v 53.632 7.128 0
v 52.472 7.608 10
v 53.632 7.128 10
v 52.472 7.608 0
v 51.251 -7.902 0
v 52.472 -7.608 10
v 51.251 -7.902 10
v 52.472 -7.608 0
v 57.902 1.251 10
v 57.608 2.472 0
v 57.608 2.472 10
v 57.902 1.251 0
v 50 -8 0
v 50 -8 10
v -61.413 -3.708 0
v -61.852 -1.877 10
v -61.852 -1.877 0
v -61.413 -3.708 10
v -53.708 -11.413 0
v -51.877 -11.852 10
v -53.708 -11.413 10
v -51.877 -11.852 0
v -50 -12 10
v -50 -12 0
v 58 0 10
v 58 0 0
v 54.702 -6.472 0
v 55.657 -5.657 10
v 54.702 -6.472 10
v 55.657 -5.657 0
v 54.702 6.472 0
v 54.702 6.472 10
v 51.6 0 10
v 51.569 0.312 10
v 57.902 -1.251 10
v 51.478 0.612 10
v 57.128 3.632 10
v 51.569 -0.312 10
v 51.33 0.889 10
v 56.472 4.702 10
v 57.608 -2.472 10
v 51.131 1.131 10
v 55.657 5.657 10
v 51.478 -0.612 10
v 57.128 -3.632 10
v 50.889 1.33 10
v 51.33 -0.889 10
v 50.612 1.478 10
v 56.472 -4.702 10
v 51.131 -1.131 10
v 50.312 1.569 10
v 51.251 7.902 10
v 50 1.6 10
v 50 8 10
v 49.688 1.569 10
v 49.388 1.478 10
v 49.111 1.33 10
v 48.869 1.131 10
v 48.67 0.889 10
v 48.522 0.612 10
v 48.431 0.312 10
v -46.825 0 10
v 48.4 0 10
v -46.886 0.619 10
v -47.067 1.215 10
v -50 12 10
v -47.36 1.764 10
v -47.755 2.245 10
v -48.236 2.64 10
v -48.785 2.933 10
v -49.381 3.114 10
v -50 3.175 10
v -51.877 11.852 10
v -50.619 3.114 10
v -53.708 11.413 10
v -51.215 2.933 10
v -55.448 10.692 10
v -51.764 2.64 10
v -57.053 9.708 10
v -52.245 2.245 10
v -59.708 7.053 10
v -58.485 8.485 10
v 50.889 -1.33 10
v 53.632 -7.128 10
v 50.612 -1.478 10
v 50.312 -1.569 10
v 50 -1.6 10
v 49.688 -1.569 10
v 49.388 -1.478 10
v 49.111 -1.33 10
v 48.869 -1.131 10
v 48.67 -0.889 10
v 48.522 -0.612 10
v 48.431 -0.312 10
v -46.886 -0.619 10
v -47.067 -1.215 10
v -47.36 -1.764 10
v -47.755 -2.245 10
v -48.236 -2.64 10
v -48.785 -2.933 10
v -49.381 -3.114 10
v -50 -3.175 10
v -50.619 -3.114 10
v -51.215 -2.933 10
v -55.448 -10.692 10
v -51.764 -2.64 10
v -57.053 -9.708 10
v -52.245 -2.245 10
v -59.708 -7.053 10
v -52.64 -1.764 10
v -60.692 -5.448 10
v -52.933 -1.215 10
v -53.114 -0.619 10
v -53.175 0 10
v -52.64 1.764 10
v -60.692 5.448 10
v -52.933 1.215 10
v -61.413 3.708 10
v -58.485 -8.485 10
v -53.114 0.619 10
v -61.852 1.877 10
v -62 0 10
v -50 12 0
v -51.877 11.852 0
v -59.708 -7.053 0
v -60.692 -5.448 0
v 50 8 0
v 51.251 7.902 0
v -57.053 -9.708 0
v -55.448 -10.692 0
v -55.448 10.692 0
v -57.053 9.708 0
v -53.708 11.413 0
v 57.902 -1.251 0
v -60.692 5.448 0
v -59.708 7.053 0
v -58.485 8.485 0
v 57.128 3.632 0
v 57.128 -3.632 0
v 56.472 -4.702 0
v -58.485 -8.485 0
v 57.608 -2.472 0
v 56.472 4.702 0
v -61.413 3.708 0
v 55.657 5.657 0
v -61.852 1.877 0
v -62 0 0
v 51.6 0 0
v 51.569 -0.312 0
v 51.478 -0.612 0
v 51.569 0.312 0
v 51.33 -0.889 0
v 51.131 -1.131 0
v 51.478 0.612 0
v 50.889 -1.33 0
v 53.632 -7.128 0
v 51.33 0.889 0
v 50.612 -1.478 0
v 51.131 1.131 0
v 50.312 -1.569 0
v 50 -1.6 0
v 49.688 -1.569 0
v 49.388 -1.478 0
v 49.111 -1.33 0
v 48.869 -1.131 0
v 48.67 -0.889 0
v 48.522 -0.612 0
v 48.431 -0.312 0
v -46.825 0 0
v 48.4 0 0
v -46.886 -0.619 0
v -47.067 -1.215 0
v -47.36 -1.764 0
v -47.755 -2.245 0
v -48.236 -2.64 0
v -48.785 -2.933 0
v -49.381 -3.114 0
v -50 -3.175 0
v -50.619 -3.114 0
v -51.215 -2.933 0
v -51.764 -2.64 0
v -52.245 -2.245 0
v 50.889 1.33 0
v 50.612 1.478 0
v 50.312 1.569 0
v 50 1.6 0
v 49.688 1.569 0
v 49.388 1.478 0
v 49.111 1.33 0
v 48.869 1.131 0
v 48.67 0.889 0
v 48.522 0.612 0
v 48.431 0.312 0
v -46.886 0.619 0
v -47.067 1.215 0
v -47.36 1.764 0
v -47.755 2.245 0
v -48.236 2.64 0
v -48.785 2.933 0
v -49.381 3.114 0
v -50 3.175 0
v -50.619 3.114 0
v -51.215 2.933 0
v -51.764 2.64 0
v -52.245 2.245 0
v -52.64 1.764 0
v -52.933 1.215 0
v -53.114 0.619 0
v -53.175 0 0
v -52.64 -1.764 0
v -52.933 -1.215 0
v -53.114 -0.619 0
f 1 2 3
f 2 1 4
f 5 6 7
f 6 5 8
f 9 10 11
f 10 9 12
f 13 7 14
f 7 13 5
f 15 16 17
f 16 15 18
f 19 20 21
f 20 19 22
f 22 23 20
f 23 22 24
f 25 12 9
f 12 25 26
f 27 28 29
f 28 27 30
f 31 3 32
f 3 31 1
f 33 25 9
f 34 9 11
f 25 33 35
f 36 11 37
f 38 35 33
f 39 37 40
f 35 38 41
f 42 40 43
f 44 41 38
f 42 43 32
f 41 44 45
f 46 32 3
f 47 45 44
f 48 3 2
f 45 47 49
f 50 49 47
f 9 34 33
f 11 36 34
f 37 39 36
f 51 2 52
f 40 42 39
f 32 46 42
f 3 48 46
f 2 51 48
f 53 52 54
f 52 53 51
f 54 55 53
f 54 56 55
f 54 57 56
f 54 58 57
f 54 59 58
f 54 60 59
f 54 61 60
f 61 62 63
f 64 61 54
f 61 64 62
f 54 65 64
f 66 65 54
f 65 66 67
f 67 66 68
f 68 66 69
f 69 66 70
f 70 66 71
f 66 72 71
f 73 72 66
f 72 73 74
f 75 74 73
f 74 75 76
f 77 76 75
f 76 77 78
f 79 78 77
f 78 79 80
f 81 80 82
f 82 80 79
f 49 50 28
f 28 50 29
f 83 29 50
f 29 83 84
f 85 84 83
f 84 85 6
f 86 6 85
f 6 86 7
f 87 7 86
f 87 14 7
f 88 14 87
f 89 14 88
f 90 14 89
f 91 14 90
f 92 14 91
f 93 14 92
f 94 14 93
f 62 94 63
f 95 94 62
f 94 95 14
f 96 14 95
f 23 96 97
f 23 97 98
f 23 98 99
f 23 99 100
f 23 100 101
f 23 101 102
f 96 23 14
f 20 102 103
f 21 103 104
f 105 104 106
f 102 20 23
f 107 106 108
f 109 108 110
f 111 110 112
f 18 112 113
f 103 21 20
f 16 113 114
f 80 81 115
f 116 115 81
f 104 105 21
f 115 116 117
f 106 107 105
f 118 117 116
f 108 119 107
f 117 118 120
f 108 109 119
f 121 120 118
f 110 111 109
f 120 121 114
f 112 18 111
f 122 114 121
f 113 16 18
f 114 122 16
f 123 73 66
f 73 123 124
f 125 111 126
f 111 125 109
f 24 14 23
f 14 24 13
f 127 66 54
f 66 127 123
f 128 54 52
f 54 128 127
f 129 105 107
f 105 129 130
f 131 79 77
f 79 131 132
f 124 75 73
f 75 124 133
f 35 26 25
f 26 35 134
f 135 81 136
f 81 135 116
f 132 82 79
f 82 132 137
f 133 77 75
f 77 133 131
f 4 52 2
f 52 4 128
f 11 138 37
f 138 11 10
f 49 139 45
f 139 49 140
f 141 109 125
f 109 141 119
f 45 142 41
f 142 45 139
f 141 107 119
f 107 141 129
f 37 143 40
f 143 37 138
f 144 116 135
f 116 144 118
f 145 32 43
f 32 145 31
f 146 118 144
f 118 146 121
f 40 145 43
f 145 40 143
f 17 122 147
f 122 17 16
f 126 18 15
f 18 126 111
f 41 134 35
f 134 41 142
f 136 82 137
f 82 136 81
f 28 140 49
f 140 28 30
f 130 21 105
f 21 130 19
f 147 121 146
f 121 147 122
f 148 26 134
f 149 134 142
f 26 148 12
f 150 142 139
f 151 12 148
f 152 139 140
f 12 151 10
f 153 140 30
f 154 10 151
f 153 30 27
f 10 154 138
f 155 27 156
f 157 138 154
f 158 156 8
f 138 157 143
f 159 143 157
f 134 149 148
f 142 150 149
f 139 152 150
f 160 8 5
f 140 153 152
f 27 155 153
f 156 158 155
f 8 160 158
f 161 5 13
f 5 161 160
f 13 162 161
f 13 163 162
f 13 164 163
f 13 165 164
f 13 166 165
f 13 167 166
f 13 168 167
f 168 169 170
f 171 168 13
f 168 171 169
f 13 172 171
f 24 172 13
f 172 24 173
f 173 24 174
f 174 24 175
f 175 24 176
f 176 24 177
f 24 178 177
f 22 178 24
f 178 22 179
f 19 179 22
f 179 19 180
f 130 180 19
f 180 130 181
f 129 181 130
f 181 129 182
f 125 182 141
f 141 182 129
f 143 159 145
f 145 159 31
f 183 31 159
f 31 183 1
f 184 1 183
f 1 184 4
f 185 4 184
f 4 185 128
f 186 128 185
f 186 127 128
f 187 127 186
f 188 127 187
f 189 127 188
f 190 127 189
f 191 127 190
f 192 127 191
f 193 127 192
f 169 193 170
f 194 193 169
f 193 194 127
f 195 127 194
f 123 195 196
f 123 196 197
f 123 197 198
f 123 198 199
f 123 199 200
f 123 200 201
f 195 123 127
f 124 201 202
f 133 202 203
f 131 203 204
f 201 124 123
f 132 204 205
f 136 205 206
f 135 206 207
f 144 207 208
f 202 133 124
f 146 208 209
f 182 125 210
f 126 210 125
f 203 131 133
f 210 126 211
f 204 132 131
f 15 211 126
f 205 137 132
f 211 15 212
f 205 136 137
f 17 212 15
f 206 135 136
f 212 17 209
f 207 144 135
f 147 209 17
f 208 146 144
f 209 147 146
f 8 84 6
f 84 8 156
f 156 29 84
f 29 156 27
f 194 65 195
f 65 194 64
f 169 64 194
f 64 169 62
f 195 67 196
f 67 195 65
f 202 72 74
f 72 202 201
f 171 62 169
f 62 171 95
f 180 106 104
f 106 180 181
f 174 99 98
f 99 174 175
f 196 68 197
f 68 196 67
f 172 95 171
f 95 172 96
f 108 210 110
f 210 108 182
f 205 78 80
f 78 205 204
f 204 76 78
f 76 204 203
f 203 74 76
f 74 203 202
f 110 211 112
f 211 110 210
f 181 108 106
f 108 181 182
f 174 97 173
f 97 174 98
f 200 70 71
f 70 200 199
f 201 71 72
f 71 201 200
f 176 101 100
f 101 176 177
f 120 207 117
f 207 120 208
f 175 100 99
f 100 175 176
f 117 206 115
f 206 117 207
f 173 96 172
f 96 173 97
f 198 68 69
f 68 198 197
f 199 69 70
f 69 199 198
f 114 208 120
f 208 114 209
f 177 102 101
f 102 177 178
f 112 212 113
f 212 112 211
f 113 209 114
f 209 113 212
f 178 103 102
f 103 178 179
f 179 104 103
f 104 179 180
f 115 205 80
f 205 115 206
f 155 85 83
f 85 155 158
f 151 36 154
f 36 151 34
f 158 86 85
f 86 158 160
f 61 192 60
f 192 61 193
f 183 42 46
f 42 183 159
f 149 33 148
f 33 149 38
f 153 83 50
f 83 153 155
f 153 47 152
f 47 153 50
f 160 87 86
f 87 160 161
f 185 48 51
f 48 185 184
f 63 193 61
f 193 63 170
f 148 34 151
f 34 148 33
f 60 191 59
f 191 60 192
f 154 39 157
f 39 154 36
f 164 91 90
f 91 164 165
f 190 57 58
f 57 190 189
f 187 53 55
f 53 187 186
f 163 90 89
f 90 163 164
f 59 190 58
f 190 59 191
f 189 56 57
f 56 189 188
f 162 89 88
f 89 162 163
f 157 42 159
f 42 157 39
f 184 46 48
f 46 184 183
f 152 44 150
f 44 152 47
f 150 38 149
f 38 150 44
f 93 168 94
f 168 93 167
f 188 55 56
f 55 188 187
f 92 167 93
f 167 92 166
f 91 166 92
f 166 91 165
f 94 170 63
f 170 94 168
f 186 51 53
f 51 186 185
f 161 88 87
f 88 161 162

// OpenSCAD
$fn = 32;

// ----------------------------------------------------------------------
// Lever: 100 mm between the bosses, 10 mm thick, smooth outline
// ----------------------------------------------------------------------

// --- parameters (mm) ---
lever_l = 100;            // distance between the boss centres
boss_a = 24;              // first boss diameter
boss_b = 16;              // second boss diameter
bore_a = 6.35;            // first bore
bore_b = 3.2;             // second bore
lever_t = 10;             // lever thickness

lever_profile = [[-62, 0], [-61.852, -1.877], [-61.413, -3.708], [-60.692, -5.448], [-59.708, -7.053], [-58.485, -8.485], [-57.053, -9.708], [-55.448, -10.692], [-53.708, -11.413], [-51.877, -11.852], [-50, -12], [50, -8], [51.251, -7.902], [52.472, -7.608], [53.632, -7.128], [54.702, -6.472], [55.657, -5.657], [56.472, -4.702], [57.128, -3.632], [57.608, -2.472], [57.902, -1.251], [58, 0], [57.902, 1.251], [57.608, 2.472], [57.128, 3.632], [56.472, 4.702], [55.657, 5.657], [54.702, 6.472], [53.632, 7.128], [52.472, 7.608], [51.251, 7.902], [50, 8], [-50, 12], [-51.877, 11.852], [-53.708, 11.413], [-55.448, 10.692], [-57.053, 9.708], [-58.485, 8.485], [-59.708, 7.053], [-60.692, 5.448], [-61.413, 3.708], [-61.852, 1.877]];

difference() {
  linear_extrude(height = lever_t) polygon(lever_profile);
  translate([-50, 0, -2.5]) cylinder(h = lever_t + 5, d = bore_a);
  translate([50, 0, -2.5]) cylinder(h = lever_t + 5, d = bore_b);
}
